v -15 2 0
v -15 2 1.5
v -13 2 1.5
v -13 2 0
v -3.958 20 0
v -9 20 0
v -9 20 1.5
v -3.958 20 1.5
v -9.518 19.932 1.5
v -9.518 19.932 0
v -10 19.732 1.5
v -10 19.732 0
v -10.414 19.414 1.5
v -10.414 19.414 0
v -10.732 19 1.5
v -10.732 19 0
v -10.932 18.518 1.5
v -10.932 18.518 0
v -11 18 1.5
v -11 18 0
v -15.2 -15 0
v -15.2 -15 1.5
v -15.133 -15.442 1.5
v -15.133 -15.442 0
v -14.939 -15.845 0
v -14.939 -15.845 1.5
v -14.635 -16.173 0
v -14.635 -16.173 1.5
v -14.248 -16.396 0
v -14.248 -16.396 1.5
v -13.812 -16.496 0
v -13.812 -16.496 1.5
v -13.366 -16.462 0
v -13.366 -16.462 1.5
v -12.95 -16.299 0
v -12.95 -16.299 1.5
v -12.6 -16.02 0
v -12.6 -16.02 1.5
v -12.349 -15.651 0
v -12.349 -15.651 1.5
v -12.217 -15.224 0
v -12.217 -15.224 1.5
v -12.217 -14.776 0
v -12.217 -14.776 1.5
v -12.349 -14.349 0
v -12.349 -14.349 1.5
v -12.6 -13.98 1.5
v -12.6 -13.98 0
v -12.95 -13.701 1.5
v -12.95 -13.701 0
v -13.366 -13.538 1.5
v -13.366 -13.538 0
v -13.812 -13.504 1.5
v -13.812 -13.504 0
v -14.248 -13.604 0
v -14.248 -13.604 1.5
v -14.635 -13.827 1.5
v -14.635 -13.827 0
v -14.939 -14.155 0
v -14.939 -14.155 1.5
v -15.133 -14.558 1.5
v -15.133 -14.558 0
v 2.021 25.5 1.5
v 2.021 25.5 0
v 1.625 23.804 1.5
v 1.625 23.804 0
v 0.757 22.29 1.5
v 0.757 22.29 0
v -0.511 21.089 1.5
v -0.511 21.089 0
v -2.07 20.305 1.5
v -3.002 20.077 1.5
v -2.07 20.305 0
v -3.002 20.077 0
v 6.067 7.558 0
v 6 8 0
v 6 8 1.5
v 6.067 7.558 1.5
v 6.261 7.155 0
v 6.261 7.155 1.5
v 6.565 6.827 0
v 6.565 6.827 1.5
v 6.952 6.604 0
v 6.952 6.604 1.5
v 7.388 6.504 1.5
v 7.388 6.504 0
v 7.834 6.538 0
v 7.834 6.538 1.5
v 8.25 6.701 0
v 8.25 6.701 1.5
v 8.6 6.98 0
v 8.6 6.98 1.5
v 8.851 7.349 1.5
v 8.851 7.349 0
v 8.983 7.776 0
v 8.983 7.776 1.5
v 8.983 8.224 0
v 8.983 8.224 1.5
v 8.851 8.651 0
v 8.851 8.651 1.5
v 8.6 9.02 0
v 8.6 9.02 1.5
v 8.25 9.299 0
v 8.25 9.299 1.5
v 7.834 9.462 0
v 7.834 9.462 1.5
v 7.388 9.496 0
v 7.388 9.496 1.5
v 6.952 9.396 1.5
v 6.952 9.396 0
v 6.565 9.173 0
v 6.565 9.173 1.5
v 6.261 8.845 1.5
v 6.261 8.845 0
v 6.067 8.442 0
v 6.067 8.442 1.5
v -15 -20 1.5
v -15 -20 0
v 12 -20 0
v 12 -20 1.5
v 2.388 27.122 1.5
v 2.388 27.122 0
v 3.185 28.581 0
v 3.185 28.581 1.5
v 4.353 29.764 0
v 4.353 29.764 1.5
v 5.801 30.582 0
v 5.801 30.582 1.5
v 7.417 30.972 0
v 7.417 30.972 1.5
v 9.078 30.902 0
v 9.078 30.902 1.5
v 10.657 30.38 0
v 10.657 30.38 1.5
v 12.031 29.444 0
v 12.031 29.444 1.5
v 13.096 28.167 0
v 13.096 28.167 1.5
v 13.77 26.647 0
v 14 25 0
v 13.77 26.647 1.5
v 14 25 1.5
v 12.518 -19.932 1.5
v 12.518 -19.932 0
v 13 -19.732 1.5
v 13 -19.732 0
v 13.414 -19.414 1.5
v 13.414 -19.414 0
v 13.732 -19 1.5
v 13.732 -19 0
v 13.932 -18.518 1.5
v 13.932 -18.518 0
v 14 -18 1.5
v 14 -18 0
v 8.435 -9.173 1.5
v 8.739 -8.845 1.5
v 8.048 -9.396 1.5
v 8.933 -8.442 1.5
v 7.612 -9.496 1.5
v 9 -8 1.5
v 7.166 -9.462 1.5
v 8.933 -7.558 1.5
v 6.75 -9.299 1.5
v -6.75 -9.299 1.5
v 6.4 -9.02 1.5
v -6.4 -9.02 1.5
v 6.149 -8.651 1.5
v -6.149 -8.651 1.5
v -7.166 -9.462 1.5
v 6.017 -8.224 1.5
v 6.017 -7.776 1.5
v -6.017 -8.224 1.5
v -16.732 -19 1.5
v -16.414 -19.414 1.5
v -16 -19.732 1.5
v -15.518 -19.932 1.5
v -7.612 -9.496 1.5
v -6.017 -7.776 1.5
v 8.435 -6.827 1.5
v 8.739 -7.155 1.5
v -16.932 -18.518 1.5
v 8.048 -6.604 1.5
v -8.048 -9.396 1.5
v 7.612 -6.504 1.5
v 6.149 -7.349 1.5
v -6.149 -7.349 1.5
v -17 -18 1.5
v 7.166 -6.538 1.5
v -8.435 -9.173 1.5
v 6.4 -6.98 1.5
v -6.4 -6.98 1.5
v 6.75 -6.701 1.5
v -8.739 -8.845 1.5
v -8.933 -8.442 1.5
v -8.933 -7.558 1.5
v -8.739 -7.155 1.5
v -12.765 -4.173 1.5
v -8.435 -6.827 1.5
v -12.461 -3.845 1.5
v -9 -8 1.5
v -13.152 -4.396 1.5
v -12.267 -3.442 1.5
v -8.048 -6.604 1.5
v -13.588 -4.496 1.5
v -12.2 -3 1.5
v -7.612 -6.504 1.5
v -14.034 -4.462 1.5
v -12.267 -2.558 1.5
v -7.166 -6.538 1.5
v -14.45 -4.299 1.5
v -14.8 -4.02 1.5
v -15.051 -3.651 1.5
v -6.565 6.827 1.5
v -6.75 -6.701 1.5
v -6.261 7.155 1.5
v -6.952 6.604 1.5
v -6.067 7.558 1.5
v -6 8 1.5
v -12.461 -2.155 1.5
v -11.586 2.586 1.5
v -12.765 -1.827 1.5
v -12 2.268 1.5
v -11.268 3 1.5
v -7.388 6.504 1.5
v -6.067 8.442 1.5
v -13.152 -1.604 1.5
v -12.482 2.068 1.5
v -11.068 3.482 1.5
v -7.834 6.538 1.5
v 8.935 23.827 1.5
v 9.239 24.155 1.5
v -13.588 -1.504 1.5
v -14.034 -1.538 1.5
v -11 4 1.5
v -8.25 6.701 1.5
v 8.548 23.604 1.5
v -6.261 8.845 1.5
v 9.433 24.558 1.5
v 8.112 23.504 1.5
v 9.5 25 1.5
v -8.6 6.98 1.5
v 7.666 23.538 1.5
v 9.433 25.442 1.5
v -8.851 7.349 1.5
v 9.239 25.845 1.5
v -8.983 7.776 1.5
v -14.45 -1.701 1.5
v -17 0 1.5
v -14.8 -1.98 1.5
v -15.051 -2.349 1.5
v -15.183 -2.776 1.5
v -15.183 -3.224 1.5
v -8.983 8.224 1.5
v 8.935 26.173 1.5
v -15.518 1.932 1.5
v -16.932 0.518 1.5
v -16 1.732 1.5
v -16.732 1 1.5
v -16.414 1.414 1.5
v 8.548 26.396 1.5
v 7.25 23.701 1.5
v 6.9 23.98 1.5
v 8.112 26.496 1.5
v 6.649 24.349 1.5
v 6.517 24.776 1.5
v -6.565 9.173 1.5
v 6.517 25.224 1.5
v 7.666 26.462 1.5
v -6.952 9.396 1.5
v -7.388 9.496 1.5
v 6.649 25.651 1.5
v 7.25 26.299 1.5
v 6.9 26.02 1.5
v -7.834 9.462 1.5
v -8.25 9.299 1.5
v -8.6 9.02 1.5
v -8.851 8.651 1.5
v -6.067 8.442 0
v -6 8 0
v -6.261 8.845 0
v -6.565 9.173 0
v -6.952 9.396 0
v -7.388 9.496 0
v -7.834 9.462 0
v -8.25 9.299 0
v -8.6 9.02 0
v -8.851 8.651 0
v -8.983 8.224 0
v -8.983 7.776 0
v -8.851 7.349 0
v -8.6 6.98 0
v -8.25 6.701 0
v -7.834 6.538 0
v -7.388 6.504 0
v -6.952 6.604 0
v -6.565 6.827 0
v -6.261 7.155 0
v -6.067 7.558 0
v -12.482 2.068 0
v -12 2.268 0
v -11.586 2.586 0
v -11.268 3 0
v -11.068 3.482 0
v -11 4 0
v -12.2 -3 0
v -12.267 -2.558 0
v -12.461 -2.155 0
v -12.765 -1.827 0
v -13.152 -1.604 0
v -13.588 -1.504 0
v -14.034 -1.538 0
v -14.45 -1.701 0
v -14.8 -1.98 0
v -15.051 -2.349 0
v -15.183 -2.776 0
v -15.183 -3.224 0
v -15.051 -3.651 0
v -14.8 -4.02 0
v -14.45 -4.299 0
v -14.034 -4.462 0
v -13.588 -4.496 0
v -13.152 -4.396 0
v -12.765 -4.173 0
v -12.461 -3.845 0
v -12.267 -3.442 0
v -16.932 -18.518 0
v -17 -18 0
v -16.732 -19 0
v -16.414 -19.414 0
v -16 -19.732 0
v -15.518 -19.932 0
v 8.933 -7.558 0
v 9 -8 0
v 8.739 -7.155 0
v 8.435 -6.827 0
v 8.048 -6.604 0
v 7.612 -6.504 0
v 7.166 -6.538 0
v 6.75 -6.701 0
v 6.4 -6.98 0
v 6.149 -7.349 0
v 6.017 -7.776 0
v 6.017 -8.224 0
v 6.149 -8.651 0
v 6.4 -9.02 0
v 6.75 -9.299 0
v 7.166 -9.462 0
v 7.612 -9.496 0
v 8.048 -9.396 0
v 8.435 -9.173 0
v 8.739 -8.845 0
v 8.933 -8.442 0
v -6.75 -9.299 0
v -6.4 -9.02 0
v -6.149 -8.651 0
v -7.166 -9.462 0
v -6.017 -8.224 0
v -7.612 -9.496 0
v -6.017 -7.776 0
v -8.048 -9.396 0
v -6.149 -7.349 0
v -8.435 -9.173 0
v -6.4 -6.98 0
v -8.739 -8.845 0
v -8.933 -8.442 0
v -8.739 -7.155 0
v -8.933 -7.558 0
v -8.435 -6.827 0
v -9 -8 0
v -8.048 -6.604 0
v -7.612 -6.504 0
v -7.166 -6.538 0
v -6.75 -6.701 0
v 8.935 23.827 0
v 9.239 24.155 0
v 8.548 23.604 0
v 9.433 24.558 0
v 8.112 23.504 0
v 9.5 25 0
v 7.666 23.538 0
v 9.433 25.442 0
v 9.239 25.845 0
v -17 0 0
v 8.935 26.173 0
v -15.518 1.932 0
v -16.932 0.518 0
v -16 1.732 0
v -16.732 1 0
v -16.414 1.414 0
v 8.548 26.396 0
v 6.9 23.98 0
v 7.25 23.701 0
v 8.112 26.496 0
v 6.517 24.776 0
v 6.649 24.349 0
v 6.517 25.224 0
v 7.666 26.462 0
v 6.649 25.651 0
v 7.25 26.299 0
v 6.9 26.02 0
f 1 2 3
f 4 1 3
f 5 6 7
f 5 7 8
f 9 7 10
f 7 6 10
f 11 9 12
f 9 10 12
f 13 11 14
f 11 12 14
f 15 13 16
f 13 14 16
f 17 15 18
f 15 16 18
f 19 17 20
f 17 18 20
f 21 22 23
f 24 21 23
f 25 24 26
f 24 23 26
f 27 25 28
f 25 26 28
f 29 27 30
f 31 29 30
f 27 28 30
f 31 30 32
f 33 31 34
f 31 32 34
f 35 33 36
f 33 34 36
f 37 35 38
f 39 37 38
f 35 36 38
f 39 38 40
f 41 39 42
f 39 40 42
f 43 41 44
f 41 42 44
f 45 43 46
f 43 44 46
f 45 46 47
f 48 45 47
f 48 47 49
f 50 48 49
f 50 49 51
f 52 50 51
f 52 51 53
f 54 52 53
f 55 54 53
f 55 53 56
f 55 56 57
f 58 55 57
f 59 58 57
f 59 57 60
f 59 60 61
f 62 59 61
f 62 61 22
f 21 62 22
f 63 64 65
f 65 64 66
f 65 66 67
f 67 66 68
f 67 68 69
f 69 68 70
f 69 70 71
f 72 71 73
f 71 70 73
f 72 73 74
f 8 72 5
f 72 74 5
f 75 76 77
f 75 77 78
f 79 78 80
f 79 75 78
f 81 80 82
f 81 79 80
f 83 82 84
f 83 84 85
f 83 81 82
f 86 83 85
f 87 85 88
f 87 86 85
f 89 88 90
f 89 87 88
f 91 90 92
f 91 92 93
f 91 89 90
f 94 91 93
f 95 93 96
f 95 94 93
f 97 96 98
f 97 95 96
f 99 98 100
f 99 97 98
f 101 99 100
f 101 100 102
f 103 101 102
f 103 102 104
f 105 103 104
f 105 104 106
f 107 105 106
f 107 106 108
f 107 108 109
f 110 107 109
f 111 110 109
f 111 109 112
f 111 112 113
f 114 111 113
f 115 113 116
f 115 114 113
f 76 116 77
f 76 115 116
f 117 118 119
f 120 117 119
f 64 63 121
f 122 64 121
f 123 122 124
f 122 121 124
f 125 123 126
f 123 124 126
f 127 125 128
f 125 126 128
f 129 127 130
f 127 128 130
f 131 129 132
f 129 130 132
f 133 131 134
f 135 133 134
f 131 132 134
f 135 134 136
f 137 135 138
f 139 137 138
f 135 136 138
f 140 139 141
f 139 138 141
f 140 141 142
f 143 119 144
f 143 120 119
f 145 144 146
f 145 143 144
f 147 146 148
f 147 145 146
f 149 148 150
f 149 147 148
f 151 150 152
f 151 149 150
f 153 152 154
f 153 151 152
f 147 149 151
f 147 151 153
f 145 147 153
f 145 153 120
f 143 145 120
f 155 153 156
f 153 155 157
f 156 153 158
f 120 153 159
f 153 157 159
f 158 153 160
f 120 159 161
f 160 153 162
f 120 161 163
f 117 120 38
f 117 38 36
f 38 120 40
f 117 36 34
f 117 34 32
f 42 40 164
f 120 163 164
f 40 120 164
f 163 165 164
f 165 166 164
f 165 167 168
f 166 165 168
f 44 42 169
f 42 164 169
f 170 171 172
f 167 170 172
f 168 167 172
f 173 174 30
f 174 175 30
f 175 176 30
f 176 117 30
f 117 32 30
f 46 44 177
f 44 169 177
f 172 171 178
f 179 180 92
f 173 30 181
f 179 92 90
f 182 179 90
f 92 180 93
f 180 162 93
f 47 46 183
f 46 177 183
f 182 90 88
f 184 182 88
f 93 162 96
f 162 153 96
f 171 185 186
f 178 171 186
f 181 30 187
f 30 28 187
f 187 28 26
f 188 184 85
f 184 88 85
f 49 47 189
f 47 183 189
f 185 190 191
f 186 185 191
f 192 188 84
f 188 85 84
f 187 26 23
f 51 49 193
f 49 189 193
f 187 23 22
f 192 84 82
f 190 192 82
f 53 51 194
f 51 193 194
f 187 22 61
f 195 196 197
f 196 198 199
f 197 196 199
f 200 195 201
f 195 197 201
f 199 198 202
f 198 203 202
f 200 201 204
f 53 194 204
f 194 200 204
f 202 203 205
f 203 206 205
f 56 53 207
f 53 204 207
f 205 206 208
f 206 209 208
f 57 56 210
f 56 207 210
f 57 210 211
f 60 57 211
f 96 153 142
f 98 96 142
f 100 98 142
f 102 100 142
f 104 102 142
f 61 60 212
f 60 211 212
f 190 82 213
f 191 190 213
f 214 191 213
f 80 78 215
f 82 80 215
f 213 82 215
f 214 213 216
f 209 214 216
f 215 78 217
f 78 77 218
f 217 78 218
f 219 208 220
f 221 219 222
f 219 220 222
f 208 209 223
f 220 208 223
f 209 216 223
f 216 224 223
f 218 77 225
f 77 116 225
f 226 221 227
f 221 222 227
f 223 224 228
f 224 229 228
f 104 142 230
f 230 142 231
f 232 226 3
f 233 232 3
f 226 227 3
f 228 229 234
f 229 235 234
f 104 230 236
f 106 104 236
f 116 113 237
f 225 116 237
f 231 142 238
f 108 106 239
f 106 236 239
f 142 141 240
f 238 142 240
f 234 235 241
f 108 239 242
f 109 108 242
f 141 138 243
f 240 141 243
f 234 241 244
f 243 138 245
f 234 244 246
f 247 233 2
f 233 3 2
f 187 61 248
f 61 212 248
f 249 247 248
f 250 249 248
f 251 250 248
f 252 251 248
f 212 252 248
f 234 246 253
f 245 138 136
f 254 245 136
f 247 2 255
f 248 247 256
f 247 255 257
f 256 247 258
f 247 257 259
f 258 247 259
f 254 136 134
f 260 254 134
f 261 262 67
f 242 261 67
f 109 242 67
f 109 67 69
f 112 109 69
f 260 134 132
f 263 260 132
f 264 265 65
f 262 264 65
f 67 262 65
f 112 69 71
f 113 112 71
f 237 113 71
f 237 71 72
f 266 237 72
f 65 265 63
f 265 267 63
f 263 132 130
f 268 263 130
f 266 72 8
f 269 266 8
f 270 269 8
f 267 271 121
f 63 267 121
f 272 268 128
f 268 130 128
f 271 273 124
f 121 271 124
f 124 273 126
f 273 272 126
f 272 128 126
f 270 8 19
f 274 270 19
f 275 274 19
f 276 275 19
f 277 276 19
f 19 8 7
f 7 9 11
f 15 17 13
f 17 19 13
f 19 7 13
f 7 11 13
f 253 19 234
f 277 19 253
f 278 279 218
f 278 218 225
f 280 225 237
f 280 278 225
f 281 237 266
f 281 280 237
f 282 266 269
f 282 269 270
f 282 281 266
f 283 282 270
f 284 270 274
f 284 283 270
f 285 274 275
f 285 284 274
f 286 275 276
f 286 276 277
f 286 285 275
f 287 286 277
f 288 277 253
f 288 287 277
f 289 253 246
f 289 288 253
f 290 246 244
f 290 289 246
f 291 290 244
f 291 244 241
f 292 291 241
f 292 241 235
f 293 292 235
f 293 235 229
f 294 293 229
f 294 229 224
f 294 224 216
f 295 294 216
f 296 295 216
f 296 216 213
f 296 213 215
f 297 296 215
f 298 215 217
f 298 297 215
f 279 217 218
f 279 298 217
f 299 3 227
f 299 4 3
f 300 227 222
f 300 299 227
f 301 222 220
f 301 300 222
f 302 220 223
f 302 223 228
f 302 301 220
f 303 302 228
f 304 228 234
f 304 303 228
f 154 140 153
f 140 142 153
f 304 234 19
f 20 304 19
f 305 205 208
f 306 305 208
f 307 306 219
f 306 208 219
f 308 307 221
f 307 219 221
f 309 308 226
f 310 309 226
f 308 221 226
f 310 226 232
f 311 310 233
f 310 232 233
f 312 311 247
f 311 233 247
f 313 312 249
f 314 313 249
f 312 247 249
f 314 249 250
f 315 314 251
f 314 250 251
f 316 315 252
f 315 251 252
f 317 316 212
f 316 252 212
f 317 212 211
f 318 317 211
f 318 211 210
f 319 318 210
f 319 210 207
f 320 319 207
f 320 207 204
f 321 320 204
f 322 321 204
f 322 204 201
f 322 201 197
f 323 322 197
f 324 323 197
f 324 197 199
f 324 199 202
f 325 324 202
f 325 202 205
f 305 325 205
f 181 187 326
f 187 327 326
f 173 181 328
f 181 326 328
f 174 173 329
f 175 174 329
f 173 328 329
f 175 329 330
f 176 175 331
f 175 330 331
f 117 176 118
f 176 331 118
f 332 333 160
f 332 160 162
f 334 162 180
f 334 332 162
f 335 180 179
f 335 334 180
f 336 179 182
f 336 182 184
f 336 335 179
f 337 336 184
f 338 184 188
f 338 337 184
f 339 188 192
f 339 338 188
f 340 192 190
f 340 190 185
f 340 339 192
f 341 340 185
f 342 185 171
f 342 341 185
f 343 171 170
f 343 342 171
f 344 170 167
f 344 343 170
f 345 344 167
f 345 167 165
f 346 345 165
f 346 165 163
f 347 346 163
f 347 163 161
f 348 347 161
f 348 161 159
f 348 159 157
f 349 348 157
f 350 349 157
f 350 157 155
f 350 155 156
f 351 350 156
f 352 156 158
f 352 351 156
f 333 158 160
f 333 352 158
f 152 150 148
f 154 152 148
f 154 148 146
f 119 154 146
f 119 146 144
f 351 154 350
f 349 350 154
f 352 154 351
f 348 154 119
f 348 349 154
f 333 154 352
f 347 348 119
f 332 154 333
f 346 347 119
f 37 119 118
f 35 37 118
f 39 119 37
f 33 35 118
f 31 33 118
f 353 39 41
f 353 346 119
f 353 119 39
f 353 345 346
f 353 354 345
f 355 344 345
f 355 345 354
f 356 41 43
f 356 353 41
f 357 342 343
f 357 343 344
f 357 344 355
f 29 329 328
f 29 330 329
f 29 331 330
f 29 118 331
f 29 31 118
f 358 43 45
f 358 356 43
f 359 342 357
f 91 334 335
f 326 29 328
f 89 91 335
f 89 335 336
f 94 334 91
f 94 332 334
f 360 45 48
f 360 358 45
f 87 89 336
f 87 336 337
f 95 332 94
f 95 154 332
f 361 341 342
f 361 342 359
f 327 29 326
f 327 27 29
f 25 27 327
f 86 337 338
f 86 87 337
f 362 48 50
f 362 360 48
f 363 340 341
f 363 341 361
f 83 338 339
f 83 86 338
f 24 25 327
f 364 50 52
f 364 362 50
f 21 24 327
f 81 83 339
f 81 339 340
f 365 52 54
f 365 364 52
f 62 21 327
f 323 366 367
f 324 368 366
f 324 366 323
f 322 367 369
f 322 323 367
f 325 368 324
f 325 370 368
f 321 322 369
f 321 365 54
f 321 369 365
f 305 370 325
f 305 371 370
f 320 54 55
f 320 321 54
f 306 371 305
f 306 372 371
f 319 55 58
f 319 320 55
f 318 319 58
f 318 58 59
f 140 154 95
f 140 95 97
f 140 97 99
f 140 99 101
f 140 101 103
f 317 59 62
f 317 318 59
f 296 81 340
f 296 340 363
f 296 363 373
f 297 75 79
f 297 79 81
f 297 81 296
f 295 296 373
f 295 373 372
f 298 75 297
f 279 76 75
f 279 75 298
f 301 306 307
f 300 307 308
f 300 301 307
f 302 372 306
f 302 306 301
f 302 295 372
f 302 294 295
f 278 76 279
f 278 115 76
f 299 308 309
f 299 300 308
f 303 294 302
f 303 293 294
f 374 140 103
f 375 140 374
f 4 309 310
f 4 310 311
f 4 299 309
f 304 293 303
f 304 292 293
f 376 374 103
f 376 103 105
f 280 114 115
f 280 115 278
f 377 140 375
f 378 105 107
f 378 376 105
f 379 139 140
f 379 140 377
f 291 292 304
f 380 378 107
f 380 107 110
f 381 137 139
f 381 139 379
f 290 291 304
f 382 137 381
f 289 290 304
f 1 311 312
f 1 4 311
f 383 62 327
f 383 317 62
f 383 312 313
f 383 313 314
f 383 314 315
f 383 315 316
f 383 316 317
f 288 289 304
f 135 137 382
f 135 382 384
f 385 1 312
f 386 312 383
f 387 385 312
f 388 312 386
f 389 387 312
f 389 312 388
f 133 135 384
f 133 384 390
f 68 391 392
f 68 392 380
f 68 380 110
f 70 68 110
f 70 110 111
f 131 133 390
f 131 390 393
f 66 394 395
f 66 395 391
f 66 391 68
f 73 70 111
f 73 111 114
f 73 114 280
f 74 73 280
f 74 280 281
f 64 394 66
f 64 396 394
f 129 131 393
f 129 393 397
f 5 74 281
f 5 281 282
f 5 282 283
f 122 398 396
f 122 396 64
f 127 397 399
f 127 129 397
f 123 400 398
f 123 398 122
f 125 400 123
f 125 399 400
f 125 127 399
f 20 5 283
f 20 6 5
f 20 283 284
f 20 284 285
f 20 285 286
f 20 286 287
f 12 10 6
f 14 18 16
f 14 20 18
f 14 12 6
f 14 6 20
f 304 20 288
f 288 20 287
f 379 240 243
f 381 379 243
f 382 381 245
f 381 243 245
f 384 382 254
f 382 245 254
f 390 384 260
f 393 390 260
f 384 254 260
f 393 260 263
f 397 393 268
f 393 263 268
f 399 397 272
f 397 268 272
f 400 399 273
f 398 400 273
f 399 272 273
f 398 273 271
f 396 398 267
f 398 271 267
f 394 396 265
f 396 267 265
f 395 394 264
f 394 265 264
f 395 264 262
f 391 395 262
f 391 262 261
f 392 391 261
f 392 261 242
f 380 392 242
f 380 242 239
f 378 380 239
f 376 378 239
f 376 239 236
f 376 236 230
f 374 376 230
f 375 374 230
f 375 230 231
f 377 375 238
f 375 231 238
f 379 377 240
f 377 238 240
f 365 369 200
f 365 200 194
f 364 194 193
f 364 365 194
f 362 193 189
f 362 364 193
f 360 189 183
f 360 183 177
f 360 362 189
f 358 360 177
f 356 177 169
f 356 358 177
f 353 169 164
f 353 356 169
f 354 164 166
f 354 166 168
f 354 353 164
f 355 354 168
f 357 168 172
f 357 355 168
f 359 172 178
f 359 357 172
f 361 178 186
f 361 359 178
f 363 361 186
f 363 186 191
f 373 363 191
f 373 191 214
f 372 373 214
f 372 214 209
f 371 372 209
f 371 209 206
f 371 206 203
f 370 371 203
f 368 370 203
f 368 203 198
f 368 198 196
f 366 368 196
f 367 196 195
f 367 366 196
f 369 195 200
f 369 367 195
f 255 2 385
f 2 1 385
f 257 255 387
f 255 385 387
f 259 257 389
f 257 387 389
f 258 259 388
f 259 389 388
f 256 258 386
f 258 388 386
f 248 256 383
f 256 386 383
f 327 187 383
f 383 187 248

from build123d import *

# Parameters (mm, degrees)
ESQUISSE1_W             = 28
ESQUISSE1_H             = 40
ESQUISSE1_R             = 1.5
BOSS_EXTRU_1_DEPTH      = 1.5
ESQUISSE3_R             = 1.5
ESQUISSE3_W             = 3
ESQUISSE3_H             = 22
BOSS_EXTRU_2_DEPTH      = 1.5
CONG_1_R                = 6
ESQUISSE4_R             = 1.5
ESQUISSE4_W             = 6
ESQUISSE4_H             = 18
ENL_V_MAT_EXTRU_1_DEPTH = 36.387144698
CONG_2_R                = 2


with BuildPart() as part:
    # Esquisse1 → Boss.-Extru.1 (new body)
    with BuildSketch(Plane.XY):
        Rectangle(ESQUISSE1_W, ESQUISSE1_H)
        with Locations((-7.5, 8)):
            Circle(ESQUISSE1_R, mode=Mode.SUBTRACT)
        with Locations(Location((7.5, 8, 0), (0, 0, 180))):
            Circle(ESQUISSE1_R, mode=Mode.SUBTRACT)
        with Locations((7.5, -8)):
            Circle(ESQUISSE1_R, mode=Mode.SUBTRACT)
        with Locations(Location((-7.5, -8, 0), (0, 0, 180))):
            Circle(ESQUISSE1_R, mode=Mode.SUBTRACT)
    extrude(amount=BOSS_EXTRU_1_DEPTH)

    # Esquisse3 → Boss.-Extru.2 (add)
    # profile 1 of 2: a face of its own
    with BuildSketch(Plane.XY.offset(1.5)):
        with BuildLine():
            Line((2, 20), (2, 25))
            ThreePointArc((2, 25), (8, 31), (14, 25))
            Line((14, 25), (14, 20))
            ThreePointArc((14, 20), (8, 14), (2, 20))
        make_face()
        with Locations((8, 25)):
            Circle(ESQUISSE3_R, mode=Mode.SUBTRACT)
    # profile 2 of 2: a face of its own
    with BuildSketch(Plane.XY.offset(1.5)):
        with Locations((-15.5, -9)):
            Rectangle(ESQUISSE3_W, ESQUISSE3_H)
    extrude(amount=-BOSS_EXTRU_2_DEPTH)

    # Congé1
    cong_1_edges = [part.edges().sort_by_distance(p)[0] for p in [
        (2, 20, 0.75),
    ]]
    fillet(cong_1_edges, radius=CONG_1_R)

    # Esquisse4 → Enlèv. mat.-Extru.1 (cut, through all)
    with BuildSketch(Plane.XY.offset(1.5)):
        with Locations((-13.7, -3)):
            Circle(ESQUISSE4_R)
        with Locations(Location((-13.7, -15, 0), (0, 0, 180))):
            Circle(ESQUISSE4_R)
        with Locations((-14, 11)):
            Rectangle(ESQUISSE4_W, ESQUISSE4_H)
    extrude(amount=-ENL_V_MAT_EXTRU_1_DEPTH, mode=Mode.SUBTRACT)

    # Congé2
    cong_2_edges = [part.edges().sort_by_distance(p)[0] for p in [
        (-17, 2, 0.75),
        (-17, -20, 0.75),
        (14, -20, 0.75),
        (-11, 2, 0.75),
        (-11, 20, 0.75),
    ]]
    fillet(cong_2_edges, radius=CONG_2_R)


solid = part.part
